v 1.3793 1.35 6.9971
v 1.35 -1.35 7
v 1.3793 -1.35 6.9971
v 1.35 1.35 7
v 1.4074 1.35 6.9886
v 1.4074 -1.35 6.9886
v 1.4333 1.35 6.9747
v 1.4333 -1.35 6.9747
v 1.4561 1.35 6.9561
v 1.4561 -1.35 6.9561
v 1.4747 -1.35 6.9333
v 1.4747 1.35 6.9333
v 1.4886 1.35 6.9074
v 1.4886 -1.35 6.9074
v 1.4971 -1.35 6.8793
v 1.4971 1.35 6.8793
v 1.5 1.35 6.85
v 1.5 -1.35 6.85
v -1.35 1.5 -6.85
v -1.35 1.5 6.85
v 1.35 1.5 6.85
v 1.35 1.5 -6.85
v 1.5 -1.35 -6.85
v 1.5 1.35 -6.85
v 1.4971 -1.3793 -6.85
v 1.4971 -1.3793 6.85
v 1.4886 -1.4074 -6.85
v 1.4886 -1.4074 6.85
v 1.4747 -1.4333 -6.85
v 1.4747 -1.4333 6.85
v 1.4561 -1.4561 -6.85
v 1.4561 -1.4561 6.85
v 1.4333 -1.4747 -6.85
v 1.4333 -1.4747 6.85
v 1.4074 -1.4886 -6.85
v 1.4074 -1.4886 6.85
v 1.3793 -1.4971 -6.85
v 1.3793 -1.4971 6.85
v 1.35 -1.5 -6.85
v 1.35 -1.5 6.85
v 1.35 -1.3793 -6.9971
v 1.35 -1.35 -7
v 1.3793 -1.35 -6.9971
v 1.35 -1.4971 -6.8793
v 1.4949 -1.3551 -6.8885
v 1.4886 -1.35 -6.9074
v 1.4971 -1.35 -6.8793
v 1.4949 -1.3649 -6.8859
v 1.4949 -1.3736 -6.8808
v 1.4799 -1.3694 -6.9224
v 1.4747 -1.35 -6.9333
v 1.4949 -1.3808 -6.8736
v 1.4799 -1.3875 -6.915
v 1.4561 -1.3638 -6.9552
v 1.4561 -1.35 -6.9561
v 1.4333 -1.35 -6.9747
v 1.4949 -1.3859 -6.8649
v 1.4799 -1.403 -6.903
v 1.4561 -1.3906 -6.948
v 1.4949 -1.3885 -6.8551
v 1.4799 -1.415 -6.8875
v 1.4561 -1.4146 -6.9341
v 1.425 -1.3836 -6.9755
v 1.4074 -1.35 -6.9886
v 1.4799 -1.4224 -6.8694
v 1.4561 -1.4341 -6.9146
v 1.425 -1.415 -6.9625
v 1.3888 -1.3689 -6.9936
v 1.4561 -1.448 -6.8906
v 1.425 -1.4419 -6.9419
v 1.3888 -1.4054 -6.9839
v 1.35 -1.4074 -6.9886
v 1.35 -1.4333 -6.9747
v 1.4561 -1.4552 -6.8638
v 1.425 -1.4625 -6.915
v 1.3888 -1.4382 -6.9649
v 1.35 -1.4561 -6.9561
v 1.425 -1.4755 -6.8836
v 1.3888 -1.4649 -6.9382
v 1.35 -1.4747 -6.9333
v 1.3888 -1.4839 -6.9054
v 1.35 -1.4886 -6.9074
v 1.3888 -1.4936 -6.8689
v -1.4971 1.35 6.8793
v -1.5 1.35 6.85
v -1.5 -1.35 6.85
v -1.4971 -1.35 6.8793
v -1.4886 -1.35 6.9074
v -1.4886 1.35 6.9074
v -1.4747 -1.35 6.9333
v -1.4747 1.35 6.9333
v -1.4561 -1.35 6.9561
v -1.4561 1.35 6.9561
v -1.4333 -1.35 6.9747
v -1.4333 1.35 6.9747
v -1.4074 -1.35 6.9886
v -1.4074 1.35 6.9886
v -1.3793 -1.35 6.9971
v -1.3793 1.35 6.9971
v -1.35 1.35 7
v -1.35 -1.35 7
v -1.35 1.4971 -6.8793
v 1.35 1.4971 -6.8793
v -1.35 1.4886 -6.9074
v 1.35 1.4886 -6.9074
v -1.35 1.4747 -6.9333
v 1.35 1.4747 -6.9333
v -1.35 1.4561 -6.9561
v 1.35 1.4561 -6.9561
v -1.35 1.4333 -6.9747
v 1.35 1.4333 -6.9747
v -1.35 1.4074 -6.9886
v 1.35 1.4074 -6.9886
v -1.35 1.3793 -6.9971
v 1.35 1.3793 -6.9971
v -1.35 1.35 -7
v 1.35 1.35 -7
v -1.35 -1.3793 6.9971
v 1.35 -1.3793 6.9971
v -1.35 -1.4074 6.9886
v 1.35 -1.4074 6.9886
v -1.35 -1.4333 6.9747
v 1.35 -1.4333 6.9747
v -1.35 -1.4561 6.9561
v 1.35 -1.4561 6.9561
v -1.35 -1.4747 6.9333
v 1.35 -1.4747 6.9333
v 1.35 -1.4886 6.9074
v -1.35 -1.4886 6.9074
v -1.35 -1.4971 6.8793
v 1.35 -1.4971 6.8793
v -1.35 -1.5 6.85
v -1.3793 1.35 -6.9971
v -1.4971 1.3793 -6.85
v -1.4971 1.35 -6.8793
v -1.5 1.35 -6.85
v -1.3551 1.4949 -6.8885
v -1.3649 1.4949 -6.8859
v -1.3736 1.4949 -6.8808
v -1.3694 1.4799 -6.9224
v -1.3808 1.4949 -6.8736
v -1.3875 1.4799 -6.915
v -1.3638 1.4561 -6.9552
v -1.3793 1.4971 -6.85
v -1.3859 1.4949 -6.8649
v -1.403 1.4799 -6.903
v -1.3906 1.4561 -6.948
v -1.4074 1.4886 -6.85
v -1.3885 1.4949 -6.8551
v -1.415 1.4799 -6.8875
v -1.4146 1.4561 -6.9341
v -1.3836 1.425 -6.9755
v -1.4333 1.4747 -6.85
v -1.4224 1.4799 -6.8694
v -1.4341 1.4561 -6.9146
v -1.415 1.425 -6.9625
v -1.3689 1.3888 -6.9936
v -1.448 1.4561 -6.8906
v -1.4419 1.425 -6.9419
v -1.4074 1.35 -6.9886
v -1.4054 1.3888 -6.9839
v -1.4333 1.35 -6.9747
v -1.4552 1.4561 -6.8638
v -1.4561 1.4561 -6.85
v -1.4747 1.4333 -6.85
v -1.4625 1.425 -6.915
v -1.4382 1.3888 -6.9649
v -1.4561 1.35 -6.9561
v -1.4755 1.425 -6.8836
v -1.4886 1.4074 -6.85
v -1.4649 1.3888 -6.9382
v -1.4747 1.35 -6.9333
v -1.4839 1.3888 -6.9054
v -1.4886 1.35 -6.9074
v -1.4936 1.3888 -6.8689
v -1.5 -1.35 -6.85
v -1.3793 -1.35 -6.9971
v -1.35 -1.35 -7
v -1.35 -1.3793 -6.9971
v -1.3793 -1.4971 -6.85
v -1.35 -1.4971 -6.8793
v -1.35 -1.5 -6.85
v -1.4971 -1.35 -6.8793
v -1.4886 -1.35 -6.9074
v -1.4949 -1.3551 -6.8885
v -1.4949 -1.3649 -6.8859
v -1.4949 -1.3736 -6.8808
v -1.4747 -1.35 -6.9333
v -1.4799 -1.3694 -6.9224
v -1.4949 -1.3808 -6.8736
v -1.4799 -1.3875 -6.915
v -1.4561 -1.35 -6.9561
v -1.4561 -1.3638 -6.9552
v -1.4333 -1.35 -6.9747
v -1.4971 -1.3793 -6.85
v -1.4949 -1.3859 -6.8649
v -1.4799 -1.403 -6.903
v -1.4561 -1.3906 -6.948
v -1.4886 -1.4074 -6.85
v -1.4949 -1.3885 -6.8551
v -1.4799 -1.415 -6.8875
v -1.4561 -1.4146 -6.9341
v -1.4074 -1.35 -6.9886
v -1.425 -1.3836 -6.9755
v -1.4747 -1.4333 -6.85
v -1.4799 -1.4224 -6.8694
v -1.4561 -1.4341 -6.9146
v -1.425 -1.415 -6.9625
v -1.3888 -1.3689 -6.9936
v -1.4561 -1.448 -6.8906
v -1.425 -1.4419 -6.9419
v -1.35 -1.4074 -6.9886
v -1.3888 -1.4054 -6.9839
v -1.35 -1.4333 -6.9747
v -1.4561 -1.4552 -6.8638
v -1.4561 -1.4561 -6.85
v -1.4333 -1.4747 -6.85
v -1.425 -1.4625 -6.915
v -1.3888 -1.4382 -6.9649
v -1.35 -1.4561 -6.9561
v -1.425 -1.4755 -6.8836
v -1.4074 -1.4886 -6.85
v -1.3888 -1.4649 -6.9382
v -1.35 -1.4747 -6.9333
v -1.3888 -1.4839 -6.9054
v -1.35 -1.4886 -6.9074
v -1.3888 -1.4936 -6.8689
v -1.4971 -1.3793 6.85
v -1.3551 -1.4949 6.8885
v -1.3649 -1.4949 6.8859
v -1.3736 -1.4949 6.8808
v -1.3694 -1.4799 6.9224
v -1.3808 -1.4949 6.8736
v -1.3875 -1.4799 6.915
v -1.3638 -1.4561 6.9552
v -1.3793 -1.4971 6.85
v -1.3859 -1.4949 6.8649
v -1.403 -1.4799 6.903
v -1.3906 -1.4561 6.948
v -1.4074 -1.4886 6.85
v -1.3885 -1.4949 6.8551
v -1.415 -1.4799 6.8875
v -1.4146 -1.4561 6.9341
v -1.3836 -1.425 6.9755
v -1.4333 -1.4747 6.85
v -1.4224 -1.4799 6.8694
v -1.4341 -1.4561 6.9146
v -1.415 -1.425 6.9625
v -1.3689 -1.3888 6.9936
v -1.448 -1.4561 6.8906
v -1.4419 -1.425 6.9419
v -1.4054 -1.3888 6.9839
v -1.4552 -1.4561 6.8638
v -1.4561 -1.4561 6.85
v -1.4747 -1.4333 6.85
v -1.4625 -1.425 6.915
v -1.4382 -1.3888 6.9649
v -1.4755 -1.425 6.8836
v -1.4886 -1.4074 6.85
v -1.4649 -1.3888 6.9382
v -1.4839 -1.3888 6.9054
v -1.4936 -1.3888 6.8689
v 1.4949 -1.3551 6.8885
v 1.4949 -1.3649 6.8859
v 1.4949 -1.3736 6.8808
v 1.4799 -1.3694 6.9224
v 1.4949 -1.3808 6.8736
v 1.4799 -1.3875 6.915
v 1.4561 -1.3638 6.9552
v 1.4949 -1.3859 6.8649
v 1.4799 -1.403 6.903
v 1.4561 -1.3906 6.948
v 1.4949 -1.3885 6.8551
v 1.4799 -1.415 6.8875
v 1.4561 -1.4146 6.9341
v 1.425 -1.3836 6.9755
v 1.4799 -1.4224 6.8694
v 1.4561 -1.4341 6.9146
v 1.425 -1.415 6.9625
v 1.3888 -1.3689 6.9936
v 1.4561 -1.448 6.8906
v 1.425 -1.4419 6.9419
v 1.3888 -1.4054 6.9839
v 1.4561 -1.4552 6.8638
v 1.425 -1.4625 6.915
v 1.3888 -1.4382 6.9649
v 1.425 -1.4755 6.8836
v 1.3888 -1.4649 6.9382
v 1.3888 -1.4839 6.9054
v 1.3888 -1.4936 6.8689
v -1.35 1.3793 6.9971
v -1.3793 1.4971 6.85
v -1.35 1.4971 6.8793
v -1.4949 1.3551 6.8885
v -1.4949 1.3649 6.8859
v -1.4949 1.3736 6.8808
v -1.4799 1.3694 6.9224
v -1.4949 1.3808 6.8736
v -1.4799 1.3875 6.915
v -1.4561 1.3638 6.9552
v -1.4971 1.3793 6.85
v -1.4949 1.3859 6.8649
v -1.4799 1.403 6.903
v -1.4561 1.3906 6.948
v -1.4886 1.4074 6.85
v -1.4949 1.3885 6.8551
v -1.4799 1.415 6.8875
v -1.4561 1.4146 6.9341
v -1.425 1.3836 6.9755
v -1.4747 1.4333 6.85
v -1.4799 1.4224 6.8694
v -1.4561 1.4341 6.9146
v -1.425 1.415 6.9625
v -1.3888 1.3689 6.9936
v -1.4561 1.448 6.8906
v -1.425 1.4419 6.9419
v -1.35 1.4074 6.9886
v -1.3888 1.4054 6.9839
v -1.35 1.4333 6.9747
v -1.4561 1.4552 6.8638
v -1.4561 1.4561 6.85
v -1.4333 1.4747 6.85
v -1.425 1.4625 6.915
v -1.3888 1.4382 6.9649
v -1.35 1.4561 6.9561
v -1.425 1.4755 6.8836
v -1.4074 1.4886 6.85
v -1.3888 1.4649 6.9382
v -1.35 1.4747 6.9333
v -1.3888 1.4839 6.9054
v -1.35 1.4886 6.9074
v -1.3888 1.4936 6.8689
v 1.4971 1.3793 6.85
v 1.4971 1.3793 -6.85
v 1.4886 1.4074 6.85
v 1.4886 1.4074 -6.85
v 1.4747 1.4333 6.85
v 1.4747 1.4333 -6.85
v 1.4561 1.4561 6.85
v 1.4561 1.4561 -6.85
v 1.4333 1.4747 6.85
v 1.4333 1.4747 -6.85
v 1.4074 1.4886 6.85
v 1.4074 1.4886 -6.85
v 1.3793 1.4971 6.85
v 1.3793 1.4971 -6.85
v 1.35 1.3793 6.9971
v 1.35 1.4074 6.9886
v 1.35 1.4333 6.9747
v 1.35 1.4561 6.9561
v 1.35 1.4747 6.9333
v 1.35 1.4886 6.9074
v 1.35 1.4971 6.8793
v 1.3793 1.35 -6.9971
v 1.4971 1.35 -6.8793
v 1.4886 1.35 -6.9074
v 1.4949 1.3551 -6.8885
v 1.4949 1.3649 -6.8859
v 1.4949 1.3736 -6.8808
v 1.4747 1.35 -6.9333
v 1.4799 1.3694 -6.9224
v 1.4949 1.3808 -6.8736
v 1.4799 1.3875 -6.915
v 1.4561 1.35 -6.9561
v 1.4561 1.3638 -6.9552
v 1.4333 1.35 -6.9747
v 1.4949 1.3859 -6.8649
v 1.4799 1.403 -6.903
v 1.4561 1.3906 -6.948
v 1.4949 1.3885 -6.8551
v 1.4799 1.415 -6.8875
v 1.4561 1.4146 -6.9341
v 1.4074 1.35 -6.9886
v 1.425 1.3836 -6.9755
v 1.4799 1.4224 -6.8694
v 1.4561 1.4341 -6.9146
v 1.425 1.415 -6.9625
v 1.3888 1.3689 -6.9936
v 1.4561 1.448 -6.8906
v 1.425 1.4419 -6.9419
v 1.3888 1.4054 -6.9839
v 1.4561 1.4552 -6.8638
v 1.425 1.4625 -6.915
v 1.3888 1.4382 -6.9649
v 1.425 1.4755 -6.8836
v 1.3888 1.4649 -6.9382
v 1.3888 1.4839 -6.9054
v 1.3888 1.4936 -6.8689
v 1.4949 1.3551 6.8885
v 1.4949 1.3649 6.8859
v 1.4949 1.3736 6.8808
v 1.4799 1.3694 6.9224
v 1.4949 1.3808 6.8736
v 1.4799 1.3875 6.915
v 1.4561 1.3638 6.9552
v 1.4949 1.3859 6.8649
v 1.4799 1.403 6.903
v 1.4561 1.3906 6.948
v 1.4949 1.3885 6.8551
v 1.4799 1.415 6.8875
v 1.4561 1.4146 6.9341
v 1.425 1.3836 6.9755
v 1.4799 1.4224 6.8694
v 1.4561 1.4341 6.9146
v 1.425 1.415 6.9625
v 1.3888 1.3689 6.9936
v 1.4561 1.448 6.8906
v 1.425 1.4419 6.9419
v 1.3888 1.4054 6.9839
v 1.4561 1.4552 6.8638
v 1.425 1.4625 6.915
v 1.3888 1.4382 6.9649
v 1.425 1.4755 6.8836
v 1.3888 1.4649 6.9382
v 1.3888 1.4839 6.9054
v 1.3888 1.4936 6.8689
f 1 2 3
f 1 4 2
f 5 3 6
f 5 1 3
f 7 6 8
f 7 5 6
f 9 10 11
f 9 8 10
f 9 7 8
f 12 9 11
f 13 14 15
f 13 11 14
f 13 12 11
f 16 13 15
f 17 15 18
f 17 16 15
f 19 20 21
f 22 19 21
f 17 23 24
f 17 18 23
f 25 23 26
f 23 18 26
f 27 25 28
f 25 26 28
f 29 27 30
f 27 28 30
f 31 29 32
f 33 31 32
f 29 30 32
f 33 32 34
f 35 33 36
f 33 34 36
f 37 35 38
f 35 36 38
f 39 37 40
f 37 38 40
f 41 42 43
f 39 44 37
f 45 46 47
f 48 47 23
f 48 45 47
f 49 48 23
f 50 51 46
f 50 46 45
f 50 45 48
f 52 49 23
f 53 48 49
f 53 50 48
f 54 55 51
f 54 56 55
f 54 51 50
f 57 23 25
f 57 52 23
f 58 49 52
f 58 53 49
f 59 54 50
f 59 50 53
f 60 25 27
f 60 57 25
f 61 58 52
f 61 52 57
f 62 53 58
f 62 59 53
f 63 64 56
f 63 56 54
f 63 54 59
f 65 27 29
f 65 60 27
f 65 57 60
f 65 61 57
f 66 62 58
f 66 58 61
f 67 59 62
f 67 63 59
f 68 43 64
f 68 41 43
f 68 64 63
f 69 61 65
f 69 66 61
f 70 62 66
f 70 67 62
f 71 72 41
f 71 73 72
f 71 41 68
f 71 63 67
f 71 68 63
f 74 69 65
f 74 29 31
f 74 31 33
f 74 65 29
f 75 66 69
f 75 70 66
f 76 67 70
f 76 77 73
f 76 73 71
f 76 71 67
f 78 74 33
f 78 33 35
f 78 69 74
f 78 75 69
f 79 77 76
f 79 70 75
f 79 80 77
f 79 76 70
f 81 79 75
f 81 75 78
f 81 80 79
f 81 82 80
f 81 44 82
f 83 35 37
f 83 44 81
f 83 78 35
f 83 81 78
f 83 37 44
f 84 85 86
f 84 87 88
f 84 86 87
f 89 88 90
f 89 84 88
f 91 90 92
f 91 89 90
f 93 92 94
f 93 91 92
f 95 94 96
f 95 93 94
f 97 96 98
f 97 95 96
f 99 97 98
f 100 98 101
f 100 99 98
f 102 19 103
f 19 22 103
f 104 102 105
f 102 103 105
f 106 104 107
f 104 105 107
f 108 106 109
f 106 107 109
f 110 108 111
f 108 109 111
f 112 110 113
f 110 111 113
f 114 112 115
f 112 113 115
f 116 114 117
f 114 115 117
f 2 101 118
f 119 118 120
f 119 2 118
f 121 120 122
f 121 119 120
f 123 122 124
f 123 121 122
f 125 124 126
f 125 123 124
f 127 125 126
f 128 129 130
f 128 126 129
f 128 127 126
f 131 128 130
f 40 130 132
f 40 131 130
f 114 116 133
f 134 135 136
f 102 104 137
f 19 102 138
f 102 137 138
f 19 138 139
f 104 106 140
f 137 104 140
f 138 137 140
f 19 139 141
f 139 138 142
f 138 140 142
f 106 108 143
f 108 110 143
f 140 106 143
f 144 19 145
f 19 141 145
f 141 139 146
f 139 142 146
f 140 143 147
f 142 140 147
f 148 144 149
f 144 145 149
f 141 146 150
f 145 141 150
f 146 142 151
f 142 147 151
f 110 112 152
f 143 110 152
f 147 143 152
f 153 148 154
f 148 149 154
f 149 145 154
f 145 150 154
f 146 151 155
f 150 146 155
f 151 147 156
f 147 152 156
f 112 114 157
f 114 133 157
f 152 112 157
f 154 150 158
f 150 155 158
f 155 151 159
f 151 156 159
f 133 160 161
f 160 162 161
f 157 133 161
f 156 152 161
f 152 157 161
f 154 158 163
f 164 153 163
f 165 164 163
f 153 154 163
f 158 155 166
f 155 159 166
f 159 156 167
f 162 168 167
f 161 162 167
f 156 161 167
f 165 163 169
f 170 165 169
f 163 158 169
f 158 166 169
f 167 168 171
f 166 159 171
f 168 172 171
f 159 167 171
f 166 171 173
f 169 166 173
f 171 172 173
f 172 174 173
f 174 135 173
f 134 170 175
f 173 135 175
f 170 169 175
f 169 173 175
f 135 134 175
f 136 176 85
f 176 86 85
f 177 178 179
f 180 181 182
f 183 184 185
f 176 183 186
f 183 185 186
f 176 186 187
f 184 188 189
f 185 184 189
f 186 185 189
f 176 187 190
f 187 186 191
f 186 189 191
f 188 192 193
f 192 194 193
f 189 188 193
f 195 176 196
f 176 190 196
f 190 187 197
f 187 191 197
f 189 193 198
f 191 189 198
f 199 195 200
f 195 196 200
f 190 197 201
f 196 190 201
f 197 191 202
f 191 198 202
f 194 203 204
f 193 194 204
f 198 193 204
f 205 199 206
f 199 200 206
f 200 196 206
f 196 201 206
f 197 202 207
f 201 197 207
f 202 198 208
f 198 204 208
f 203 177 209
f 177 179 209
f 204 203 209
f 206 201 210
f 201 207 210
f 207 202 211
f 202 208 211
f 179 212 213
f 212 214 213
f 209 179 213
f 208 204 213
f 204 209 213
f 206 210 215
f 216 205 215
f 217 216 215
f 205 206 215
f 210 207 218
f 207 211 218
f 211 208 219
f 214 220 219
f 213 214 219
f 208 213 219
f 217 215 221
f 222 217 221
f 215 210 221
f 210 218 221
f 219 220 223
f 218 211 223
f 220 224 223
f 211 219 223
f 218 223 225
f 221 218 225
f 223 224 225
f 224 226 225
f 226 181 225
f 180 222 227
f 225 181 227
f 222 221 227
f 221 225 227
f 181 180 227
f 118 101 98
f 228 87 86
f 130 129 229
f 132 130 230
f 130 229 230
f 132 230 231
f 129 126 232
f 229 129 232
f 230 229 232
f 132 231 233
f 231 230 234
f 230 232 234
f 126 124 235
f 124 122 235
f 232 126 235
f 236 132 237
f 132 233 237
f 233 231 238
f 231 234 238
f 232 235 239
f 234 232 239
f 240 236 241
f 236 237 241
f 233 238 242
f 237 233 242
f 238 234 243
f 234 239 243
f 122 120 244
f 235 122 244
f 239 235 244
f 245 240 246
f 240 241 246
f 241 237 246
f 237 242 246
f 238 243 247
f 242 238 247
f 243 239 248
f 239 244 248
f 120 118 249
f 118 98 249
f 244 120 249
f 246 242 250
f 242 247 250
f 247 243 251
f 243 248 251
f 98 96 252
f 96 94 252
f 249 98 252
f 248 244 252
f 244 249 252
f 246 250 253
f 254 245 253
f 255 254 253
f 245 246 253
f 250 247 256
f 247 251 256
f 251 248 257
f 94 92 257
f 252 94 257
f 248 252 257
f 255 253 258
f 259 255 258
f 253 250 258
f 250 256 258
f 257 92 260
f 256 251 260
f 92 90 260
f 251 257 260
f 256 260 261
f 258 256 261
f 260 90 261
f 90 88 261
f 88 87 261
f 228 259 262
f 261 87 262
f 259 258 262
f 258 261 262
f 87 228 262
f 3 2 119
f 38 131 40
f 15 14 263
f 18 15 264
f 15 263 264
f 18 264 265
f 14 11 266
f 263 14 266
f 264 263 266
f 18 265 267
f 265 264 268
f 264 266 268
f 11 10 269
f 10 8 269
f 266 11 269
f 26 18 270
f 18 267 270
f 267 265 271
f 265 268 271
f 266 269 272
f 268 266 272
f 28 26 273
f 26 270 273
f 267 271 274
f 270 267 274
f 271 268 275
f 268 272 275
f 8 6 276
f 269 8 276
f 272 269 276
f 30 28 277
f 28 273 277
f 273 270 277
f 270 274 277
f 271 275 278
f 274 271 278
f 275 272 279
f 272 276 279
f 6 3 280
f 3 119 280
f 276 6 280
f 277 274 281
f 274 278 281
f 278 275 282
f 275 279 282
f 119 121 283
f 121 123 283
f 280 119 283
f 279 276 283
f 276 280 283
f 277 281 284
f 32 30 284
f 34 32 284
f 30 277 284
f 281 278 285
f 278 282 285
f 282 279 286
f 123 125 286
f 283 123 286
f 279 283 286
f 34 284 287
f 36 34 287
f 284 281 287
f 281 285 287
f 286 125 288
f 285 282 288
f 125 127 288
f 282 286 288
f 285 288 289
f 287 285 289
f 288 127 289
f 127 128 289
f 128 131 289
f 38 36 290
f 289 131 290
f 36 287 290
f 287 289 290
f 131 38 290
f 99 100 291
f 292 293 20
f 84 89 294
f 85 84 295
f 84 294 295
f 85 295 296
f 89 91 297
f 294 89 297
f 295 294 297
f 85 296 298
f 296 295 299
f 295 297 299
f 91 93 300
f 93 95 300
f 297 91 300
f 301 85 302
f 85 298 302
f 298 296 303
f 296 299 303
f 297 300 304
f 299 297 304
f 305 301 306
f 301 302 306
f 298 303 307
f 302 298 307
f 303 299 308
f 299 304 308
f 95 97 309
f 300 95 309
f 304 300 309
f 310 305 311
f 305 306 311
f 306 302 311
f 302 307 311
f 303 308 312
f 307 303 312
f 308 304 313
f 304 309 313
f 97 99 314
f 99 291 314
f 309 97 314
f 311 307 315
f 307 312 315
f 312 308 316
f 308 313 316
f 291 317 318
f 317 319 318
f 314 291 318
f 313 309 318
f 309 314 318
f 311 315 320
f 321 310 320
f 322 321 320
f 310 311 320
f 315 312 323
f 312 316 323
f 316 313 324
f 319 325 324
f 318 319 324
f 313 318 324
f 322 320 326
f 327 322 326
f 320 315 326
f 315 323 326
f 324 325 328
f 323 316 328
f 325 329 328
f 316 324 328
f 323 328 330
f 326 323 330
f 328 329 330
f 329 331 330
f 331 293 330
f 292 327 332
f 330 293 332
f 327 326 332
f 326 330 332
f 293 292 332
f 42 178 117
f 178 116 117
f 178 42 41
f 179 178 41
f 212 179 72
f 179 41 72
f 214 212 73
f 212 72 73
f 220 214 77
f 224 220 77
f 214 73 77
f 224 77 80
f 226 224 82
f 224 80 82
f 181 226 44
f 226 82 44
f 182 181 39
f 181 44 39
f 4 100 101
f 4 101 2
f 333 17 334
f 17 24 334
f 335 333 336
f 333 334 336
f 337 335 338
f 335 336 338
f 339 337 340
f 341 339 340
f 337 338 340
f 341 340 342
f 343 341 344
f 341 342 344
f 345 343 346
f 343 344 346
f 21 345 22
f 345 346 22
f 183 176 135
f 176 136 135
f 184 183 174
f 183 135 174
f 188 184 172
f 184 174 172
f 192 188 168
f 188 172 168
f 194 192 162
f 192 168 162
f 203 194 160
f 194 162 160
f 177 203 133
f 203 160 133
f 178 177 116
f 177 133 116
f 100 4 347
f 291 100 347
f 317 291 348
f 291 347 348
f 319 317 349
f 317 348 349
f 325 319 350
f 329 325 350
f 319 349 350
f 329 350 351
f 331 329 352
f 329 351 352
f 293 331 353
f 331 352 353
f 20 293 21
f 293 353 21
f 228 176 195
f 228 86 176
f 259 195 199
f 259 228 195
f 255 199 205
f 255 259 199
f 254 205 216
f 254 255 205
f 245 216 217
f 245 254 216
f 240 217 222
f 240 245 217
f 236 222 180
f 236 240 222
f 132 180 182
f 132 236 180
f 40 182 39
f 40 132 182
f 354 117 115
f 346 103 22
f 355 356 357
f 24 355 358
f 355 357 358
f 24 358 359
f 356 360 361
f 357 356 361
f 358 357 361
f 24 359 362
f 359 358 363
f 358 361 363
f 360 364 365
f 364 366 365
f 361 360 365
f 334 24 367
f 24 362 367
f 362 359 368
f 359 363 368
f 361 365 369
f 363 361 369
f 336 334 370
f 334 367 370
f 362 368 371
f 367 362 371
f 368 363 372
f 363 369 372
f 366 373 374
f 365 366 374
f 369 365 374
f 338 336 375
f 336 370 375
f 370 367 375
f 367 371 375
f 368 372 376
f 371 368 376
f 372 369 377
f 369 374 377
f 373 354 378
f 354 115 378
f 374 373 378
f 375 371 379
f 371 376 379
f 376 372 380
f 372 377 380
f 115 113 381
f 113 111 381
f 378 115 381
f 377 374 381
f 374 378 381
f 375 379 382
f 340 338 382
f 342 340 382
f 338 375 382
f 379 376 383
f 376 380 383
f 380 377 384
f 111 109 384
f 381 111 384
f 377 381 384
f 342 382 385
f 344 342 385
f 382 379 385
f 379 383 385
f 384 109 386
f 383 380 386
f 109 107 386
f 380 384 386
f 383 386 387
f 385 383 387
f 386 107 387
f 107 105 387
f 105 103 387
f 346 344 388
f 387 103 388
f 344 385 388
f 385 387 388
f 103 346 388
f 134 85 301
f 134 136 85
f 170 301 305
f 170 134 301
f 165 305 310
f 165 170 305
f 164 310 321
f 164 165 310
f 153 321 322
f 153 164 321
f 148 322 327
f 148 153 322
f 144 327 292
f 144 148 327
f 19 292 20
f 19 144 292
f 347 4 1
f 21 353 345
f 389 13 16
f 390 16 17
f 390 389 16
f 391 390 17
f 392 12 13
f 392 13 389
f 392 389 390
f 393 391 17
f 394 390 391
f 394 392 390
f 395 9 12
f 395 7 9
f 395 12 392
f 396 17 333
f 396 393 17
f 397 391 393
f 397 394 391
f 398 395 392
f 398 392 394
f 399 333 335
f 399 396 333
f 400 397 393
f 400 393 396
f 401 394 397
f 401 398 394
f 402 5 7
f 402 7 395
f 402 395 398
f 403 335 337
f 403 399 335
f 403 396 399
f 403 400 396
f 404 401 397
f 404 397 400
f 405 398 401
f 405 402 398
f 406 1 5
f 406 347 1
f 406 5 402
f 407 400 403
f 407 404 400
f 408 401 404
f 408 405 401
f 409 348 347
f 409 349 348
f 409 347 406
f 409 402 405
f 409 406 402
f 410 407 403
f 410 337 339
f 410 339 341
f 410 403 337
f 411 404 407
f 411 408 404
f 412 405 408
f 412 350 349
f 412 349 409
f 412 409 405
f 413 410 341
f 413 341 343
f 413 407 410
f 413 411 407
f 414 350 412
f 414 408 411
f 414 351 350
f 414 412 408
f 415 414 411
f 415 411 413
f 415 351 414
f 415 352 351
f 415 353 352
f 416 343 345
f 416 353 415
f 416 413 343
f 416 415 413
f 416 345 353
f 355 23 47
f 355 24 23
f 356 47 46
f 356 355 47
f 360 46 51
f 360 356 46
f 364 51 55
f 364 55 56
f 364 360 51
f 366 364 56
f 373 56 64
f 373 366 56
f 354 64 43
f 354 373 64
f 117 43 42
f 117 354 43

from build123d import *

# Parameters (mm, degrees)
SKETCH3_W                = 3
SKETCH3_H                = 3
BOSS_EXTRUDE1_DEPTH      = 7
BOSS_EXTRUDE1_DEPTH_BACK = 7
FILLET2_R                = 0.15


with BuildPart() as part:
    # Sketch3 → Boss-Extrude1 (new body, two sides)
    with BuildSketch(Plane.XY) as boss_extrude1_sk:
        Rectangle(SKETCH3_W, SKETCH3_H)
    extrude(amount=BOSS_EXTRUDE1_DEPTH)
    extrude(boss_extrude1_sk.sketch, amount=-BOSS_EXTRUDE1_DEPTH_BACK)

    # Fillet2
    fillet2_edges = [part.edges().sort_by_distance(p)[0] for p in [
        (0, 1.5, 7),
        (0, -1.5, -7),
        (-1.5, 0, -7),
        (0, 1.5, -7),
        (1.5, 0, -7),
        (-1.5, 0, 7),
        (0, -1.5, 7),
        (1.5, 0, 7),
        (-1.5, -1.5, 0),
        (-1.5, 1.5, 0),
        (1.5, 1.5, 0),
        (1.5, -1.5, 0),
    ]]
    fillet(fillet2_edges, radius=FILLET2_R)


solid = part.part
